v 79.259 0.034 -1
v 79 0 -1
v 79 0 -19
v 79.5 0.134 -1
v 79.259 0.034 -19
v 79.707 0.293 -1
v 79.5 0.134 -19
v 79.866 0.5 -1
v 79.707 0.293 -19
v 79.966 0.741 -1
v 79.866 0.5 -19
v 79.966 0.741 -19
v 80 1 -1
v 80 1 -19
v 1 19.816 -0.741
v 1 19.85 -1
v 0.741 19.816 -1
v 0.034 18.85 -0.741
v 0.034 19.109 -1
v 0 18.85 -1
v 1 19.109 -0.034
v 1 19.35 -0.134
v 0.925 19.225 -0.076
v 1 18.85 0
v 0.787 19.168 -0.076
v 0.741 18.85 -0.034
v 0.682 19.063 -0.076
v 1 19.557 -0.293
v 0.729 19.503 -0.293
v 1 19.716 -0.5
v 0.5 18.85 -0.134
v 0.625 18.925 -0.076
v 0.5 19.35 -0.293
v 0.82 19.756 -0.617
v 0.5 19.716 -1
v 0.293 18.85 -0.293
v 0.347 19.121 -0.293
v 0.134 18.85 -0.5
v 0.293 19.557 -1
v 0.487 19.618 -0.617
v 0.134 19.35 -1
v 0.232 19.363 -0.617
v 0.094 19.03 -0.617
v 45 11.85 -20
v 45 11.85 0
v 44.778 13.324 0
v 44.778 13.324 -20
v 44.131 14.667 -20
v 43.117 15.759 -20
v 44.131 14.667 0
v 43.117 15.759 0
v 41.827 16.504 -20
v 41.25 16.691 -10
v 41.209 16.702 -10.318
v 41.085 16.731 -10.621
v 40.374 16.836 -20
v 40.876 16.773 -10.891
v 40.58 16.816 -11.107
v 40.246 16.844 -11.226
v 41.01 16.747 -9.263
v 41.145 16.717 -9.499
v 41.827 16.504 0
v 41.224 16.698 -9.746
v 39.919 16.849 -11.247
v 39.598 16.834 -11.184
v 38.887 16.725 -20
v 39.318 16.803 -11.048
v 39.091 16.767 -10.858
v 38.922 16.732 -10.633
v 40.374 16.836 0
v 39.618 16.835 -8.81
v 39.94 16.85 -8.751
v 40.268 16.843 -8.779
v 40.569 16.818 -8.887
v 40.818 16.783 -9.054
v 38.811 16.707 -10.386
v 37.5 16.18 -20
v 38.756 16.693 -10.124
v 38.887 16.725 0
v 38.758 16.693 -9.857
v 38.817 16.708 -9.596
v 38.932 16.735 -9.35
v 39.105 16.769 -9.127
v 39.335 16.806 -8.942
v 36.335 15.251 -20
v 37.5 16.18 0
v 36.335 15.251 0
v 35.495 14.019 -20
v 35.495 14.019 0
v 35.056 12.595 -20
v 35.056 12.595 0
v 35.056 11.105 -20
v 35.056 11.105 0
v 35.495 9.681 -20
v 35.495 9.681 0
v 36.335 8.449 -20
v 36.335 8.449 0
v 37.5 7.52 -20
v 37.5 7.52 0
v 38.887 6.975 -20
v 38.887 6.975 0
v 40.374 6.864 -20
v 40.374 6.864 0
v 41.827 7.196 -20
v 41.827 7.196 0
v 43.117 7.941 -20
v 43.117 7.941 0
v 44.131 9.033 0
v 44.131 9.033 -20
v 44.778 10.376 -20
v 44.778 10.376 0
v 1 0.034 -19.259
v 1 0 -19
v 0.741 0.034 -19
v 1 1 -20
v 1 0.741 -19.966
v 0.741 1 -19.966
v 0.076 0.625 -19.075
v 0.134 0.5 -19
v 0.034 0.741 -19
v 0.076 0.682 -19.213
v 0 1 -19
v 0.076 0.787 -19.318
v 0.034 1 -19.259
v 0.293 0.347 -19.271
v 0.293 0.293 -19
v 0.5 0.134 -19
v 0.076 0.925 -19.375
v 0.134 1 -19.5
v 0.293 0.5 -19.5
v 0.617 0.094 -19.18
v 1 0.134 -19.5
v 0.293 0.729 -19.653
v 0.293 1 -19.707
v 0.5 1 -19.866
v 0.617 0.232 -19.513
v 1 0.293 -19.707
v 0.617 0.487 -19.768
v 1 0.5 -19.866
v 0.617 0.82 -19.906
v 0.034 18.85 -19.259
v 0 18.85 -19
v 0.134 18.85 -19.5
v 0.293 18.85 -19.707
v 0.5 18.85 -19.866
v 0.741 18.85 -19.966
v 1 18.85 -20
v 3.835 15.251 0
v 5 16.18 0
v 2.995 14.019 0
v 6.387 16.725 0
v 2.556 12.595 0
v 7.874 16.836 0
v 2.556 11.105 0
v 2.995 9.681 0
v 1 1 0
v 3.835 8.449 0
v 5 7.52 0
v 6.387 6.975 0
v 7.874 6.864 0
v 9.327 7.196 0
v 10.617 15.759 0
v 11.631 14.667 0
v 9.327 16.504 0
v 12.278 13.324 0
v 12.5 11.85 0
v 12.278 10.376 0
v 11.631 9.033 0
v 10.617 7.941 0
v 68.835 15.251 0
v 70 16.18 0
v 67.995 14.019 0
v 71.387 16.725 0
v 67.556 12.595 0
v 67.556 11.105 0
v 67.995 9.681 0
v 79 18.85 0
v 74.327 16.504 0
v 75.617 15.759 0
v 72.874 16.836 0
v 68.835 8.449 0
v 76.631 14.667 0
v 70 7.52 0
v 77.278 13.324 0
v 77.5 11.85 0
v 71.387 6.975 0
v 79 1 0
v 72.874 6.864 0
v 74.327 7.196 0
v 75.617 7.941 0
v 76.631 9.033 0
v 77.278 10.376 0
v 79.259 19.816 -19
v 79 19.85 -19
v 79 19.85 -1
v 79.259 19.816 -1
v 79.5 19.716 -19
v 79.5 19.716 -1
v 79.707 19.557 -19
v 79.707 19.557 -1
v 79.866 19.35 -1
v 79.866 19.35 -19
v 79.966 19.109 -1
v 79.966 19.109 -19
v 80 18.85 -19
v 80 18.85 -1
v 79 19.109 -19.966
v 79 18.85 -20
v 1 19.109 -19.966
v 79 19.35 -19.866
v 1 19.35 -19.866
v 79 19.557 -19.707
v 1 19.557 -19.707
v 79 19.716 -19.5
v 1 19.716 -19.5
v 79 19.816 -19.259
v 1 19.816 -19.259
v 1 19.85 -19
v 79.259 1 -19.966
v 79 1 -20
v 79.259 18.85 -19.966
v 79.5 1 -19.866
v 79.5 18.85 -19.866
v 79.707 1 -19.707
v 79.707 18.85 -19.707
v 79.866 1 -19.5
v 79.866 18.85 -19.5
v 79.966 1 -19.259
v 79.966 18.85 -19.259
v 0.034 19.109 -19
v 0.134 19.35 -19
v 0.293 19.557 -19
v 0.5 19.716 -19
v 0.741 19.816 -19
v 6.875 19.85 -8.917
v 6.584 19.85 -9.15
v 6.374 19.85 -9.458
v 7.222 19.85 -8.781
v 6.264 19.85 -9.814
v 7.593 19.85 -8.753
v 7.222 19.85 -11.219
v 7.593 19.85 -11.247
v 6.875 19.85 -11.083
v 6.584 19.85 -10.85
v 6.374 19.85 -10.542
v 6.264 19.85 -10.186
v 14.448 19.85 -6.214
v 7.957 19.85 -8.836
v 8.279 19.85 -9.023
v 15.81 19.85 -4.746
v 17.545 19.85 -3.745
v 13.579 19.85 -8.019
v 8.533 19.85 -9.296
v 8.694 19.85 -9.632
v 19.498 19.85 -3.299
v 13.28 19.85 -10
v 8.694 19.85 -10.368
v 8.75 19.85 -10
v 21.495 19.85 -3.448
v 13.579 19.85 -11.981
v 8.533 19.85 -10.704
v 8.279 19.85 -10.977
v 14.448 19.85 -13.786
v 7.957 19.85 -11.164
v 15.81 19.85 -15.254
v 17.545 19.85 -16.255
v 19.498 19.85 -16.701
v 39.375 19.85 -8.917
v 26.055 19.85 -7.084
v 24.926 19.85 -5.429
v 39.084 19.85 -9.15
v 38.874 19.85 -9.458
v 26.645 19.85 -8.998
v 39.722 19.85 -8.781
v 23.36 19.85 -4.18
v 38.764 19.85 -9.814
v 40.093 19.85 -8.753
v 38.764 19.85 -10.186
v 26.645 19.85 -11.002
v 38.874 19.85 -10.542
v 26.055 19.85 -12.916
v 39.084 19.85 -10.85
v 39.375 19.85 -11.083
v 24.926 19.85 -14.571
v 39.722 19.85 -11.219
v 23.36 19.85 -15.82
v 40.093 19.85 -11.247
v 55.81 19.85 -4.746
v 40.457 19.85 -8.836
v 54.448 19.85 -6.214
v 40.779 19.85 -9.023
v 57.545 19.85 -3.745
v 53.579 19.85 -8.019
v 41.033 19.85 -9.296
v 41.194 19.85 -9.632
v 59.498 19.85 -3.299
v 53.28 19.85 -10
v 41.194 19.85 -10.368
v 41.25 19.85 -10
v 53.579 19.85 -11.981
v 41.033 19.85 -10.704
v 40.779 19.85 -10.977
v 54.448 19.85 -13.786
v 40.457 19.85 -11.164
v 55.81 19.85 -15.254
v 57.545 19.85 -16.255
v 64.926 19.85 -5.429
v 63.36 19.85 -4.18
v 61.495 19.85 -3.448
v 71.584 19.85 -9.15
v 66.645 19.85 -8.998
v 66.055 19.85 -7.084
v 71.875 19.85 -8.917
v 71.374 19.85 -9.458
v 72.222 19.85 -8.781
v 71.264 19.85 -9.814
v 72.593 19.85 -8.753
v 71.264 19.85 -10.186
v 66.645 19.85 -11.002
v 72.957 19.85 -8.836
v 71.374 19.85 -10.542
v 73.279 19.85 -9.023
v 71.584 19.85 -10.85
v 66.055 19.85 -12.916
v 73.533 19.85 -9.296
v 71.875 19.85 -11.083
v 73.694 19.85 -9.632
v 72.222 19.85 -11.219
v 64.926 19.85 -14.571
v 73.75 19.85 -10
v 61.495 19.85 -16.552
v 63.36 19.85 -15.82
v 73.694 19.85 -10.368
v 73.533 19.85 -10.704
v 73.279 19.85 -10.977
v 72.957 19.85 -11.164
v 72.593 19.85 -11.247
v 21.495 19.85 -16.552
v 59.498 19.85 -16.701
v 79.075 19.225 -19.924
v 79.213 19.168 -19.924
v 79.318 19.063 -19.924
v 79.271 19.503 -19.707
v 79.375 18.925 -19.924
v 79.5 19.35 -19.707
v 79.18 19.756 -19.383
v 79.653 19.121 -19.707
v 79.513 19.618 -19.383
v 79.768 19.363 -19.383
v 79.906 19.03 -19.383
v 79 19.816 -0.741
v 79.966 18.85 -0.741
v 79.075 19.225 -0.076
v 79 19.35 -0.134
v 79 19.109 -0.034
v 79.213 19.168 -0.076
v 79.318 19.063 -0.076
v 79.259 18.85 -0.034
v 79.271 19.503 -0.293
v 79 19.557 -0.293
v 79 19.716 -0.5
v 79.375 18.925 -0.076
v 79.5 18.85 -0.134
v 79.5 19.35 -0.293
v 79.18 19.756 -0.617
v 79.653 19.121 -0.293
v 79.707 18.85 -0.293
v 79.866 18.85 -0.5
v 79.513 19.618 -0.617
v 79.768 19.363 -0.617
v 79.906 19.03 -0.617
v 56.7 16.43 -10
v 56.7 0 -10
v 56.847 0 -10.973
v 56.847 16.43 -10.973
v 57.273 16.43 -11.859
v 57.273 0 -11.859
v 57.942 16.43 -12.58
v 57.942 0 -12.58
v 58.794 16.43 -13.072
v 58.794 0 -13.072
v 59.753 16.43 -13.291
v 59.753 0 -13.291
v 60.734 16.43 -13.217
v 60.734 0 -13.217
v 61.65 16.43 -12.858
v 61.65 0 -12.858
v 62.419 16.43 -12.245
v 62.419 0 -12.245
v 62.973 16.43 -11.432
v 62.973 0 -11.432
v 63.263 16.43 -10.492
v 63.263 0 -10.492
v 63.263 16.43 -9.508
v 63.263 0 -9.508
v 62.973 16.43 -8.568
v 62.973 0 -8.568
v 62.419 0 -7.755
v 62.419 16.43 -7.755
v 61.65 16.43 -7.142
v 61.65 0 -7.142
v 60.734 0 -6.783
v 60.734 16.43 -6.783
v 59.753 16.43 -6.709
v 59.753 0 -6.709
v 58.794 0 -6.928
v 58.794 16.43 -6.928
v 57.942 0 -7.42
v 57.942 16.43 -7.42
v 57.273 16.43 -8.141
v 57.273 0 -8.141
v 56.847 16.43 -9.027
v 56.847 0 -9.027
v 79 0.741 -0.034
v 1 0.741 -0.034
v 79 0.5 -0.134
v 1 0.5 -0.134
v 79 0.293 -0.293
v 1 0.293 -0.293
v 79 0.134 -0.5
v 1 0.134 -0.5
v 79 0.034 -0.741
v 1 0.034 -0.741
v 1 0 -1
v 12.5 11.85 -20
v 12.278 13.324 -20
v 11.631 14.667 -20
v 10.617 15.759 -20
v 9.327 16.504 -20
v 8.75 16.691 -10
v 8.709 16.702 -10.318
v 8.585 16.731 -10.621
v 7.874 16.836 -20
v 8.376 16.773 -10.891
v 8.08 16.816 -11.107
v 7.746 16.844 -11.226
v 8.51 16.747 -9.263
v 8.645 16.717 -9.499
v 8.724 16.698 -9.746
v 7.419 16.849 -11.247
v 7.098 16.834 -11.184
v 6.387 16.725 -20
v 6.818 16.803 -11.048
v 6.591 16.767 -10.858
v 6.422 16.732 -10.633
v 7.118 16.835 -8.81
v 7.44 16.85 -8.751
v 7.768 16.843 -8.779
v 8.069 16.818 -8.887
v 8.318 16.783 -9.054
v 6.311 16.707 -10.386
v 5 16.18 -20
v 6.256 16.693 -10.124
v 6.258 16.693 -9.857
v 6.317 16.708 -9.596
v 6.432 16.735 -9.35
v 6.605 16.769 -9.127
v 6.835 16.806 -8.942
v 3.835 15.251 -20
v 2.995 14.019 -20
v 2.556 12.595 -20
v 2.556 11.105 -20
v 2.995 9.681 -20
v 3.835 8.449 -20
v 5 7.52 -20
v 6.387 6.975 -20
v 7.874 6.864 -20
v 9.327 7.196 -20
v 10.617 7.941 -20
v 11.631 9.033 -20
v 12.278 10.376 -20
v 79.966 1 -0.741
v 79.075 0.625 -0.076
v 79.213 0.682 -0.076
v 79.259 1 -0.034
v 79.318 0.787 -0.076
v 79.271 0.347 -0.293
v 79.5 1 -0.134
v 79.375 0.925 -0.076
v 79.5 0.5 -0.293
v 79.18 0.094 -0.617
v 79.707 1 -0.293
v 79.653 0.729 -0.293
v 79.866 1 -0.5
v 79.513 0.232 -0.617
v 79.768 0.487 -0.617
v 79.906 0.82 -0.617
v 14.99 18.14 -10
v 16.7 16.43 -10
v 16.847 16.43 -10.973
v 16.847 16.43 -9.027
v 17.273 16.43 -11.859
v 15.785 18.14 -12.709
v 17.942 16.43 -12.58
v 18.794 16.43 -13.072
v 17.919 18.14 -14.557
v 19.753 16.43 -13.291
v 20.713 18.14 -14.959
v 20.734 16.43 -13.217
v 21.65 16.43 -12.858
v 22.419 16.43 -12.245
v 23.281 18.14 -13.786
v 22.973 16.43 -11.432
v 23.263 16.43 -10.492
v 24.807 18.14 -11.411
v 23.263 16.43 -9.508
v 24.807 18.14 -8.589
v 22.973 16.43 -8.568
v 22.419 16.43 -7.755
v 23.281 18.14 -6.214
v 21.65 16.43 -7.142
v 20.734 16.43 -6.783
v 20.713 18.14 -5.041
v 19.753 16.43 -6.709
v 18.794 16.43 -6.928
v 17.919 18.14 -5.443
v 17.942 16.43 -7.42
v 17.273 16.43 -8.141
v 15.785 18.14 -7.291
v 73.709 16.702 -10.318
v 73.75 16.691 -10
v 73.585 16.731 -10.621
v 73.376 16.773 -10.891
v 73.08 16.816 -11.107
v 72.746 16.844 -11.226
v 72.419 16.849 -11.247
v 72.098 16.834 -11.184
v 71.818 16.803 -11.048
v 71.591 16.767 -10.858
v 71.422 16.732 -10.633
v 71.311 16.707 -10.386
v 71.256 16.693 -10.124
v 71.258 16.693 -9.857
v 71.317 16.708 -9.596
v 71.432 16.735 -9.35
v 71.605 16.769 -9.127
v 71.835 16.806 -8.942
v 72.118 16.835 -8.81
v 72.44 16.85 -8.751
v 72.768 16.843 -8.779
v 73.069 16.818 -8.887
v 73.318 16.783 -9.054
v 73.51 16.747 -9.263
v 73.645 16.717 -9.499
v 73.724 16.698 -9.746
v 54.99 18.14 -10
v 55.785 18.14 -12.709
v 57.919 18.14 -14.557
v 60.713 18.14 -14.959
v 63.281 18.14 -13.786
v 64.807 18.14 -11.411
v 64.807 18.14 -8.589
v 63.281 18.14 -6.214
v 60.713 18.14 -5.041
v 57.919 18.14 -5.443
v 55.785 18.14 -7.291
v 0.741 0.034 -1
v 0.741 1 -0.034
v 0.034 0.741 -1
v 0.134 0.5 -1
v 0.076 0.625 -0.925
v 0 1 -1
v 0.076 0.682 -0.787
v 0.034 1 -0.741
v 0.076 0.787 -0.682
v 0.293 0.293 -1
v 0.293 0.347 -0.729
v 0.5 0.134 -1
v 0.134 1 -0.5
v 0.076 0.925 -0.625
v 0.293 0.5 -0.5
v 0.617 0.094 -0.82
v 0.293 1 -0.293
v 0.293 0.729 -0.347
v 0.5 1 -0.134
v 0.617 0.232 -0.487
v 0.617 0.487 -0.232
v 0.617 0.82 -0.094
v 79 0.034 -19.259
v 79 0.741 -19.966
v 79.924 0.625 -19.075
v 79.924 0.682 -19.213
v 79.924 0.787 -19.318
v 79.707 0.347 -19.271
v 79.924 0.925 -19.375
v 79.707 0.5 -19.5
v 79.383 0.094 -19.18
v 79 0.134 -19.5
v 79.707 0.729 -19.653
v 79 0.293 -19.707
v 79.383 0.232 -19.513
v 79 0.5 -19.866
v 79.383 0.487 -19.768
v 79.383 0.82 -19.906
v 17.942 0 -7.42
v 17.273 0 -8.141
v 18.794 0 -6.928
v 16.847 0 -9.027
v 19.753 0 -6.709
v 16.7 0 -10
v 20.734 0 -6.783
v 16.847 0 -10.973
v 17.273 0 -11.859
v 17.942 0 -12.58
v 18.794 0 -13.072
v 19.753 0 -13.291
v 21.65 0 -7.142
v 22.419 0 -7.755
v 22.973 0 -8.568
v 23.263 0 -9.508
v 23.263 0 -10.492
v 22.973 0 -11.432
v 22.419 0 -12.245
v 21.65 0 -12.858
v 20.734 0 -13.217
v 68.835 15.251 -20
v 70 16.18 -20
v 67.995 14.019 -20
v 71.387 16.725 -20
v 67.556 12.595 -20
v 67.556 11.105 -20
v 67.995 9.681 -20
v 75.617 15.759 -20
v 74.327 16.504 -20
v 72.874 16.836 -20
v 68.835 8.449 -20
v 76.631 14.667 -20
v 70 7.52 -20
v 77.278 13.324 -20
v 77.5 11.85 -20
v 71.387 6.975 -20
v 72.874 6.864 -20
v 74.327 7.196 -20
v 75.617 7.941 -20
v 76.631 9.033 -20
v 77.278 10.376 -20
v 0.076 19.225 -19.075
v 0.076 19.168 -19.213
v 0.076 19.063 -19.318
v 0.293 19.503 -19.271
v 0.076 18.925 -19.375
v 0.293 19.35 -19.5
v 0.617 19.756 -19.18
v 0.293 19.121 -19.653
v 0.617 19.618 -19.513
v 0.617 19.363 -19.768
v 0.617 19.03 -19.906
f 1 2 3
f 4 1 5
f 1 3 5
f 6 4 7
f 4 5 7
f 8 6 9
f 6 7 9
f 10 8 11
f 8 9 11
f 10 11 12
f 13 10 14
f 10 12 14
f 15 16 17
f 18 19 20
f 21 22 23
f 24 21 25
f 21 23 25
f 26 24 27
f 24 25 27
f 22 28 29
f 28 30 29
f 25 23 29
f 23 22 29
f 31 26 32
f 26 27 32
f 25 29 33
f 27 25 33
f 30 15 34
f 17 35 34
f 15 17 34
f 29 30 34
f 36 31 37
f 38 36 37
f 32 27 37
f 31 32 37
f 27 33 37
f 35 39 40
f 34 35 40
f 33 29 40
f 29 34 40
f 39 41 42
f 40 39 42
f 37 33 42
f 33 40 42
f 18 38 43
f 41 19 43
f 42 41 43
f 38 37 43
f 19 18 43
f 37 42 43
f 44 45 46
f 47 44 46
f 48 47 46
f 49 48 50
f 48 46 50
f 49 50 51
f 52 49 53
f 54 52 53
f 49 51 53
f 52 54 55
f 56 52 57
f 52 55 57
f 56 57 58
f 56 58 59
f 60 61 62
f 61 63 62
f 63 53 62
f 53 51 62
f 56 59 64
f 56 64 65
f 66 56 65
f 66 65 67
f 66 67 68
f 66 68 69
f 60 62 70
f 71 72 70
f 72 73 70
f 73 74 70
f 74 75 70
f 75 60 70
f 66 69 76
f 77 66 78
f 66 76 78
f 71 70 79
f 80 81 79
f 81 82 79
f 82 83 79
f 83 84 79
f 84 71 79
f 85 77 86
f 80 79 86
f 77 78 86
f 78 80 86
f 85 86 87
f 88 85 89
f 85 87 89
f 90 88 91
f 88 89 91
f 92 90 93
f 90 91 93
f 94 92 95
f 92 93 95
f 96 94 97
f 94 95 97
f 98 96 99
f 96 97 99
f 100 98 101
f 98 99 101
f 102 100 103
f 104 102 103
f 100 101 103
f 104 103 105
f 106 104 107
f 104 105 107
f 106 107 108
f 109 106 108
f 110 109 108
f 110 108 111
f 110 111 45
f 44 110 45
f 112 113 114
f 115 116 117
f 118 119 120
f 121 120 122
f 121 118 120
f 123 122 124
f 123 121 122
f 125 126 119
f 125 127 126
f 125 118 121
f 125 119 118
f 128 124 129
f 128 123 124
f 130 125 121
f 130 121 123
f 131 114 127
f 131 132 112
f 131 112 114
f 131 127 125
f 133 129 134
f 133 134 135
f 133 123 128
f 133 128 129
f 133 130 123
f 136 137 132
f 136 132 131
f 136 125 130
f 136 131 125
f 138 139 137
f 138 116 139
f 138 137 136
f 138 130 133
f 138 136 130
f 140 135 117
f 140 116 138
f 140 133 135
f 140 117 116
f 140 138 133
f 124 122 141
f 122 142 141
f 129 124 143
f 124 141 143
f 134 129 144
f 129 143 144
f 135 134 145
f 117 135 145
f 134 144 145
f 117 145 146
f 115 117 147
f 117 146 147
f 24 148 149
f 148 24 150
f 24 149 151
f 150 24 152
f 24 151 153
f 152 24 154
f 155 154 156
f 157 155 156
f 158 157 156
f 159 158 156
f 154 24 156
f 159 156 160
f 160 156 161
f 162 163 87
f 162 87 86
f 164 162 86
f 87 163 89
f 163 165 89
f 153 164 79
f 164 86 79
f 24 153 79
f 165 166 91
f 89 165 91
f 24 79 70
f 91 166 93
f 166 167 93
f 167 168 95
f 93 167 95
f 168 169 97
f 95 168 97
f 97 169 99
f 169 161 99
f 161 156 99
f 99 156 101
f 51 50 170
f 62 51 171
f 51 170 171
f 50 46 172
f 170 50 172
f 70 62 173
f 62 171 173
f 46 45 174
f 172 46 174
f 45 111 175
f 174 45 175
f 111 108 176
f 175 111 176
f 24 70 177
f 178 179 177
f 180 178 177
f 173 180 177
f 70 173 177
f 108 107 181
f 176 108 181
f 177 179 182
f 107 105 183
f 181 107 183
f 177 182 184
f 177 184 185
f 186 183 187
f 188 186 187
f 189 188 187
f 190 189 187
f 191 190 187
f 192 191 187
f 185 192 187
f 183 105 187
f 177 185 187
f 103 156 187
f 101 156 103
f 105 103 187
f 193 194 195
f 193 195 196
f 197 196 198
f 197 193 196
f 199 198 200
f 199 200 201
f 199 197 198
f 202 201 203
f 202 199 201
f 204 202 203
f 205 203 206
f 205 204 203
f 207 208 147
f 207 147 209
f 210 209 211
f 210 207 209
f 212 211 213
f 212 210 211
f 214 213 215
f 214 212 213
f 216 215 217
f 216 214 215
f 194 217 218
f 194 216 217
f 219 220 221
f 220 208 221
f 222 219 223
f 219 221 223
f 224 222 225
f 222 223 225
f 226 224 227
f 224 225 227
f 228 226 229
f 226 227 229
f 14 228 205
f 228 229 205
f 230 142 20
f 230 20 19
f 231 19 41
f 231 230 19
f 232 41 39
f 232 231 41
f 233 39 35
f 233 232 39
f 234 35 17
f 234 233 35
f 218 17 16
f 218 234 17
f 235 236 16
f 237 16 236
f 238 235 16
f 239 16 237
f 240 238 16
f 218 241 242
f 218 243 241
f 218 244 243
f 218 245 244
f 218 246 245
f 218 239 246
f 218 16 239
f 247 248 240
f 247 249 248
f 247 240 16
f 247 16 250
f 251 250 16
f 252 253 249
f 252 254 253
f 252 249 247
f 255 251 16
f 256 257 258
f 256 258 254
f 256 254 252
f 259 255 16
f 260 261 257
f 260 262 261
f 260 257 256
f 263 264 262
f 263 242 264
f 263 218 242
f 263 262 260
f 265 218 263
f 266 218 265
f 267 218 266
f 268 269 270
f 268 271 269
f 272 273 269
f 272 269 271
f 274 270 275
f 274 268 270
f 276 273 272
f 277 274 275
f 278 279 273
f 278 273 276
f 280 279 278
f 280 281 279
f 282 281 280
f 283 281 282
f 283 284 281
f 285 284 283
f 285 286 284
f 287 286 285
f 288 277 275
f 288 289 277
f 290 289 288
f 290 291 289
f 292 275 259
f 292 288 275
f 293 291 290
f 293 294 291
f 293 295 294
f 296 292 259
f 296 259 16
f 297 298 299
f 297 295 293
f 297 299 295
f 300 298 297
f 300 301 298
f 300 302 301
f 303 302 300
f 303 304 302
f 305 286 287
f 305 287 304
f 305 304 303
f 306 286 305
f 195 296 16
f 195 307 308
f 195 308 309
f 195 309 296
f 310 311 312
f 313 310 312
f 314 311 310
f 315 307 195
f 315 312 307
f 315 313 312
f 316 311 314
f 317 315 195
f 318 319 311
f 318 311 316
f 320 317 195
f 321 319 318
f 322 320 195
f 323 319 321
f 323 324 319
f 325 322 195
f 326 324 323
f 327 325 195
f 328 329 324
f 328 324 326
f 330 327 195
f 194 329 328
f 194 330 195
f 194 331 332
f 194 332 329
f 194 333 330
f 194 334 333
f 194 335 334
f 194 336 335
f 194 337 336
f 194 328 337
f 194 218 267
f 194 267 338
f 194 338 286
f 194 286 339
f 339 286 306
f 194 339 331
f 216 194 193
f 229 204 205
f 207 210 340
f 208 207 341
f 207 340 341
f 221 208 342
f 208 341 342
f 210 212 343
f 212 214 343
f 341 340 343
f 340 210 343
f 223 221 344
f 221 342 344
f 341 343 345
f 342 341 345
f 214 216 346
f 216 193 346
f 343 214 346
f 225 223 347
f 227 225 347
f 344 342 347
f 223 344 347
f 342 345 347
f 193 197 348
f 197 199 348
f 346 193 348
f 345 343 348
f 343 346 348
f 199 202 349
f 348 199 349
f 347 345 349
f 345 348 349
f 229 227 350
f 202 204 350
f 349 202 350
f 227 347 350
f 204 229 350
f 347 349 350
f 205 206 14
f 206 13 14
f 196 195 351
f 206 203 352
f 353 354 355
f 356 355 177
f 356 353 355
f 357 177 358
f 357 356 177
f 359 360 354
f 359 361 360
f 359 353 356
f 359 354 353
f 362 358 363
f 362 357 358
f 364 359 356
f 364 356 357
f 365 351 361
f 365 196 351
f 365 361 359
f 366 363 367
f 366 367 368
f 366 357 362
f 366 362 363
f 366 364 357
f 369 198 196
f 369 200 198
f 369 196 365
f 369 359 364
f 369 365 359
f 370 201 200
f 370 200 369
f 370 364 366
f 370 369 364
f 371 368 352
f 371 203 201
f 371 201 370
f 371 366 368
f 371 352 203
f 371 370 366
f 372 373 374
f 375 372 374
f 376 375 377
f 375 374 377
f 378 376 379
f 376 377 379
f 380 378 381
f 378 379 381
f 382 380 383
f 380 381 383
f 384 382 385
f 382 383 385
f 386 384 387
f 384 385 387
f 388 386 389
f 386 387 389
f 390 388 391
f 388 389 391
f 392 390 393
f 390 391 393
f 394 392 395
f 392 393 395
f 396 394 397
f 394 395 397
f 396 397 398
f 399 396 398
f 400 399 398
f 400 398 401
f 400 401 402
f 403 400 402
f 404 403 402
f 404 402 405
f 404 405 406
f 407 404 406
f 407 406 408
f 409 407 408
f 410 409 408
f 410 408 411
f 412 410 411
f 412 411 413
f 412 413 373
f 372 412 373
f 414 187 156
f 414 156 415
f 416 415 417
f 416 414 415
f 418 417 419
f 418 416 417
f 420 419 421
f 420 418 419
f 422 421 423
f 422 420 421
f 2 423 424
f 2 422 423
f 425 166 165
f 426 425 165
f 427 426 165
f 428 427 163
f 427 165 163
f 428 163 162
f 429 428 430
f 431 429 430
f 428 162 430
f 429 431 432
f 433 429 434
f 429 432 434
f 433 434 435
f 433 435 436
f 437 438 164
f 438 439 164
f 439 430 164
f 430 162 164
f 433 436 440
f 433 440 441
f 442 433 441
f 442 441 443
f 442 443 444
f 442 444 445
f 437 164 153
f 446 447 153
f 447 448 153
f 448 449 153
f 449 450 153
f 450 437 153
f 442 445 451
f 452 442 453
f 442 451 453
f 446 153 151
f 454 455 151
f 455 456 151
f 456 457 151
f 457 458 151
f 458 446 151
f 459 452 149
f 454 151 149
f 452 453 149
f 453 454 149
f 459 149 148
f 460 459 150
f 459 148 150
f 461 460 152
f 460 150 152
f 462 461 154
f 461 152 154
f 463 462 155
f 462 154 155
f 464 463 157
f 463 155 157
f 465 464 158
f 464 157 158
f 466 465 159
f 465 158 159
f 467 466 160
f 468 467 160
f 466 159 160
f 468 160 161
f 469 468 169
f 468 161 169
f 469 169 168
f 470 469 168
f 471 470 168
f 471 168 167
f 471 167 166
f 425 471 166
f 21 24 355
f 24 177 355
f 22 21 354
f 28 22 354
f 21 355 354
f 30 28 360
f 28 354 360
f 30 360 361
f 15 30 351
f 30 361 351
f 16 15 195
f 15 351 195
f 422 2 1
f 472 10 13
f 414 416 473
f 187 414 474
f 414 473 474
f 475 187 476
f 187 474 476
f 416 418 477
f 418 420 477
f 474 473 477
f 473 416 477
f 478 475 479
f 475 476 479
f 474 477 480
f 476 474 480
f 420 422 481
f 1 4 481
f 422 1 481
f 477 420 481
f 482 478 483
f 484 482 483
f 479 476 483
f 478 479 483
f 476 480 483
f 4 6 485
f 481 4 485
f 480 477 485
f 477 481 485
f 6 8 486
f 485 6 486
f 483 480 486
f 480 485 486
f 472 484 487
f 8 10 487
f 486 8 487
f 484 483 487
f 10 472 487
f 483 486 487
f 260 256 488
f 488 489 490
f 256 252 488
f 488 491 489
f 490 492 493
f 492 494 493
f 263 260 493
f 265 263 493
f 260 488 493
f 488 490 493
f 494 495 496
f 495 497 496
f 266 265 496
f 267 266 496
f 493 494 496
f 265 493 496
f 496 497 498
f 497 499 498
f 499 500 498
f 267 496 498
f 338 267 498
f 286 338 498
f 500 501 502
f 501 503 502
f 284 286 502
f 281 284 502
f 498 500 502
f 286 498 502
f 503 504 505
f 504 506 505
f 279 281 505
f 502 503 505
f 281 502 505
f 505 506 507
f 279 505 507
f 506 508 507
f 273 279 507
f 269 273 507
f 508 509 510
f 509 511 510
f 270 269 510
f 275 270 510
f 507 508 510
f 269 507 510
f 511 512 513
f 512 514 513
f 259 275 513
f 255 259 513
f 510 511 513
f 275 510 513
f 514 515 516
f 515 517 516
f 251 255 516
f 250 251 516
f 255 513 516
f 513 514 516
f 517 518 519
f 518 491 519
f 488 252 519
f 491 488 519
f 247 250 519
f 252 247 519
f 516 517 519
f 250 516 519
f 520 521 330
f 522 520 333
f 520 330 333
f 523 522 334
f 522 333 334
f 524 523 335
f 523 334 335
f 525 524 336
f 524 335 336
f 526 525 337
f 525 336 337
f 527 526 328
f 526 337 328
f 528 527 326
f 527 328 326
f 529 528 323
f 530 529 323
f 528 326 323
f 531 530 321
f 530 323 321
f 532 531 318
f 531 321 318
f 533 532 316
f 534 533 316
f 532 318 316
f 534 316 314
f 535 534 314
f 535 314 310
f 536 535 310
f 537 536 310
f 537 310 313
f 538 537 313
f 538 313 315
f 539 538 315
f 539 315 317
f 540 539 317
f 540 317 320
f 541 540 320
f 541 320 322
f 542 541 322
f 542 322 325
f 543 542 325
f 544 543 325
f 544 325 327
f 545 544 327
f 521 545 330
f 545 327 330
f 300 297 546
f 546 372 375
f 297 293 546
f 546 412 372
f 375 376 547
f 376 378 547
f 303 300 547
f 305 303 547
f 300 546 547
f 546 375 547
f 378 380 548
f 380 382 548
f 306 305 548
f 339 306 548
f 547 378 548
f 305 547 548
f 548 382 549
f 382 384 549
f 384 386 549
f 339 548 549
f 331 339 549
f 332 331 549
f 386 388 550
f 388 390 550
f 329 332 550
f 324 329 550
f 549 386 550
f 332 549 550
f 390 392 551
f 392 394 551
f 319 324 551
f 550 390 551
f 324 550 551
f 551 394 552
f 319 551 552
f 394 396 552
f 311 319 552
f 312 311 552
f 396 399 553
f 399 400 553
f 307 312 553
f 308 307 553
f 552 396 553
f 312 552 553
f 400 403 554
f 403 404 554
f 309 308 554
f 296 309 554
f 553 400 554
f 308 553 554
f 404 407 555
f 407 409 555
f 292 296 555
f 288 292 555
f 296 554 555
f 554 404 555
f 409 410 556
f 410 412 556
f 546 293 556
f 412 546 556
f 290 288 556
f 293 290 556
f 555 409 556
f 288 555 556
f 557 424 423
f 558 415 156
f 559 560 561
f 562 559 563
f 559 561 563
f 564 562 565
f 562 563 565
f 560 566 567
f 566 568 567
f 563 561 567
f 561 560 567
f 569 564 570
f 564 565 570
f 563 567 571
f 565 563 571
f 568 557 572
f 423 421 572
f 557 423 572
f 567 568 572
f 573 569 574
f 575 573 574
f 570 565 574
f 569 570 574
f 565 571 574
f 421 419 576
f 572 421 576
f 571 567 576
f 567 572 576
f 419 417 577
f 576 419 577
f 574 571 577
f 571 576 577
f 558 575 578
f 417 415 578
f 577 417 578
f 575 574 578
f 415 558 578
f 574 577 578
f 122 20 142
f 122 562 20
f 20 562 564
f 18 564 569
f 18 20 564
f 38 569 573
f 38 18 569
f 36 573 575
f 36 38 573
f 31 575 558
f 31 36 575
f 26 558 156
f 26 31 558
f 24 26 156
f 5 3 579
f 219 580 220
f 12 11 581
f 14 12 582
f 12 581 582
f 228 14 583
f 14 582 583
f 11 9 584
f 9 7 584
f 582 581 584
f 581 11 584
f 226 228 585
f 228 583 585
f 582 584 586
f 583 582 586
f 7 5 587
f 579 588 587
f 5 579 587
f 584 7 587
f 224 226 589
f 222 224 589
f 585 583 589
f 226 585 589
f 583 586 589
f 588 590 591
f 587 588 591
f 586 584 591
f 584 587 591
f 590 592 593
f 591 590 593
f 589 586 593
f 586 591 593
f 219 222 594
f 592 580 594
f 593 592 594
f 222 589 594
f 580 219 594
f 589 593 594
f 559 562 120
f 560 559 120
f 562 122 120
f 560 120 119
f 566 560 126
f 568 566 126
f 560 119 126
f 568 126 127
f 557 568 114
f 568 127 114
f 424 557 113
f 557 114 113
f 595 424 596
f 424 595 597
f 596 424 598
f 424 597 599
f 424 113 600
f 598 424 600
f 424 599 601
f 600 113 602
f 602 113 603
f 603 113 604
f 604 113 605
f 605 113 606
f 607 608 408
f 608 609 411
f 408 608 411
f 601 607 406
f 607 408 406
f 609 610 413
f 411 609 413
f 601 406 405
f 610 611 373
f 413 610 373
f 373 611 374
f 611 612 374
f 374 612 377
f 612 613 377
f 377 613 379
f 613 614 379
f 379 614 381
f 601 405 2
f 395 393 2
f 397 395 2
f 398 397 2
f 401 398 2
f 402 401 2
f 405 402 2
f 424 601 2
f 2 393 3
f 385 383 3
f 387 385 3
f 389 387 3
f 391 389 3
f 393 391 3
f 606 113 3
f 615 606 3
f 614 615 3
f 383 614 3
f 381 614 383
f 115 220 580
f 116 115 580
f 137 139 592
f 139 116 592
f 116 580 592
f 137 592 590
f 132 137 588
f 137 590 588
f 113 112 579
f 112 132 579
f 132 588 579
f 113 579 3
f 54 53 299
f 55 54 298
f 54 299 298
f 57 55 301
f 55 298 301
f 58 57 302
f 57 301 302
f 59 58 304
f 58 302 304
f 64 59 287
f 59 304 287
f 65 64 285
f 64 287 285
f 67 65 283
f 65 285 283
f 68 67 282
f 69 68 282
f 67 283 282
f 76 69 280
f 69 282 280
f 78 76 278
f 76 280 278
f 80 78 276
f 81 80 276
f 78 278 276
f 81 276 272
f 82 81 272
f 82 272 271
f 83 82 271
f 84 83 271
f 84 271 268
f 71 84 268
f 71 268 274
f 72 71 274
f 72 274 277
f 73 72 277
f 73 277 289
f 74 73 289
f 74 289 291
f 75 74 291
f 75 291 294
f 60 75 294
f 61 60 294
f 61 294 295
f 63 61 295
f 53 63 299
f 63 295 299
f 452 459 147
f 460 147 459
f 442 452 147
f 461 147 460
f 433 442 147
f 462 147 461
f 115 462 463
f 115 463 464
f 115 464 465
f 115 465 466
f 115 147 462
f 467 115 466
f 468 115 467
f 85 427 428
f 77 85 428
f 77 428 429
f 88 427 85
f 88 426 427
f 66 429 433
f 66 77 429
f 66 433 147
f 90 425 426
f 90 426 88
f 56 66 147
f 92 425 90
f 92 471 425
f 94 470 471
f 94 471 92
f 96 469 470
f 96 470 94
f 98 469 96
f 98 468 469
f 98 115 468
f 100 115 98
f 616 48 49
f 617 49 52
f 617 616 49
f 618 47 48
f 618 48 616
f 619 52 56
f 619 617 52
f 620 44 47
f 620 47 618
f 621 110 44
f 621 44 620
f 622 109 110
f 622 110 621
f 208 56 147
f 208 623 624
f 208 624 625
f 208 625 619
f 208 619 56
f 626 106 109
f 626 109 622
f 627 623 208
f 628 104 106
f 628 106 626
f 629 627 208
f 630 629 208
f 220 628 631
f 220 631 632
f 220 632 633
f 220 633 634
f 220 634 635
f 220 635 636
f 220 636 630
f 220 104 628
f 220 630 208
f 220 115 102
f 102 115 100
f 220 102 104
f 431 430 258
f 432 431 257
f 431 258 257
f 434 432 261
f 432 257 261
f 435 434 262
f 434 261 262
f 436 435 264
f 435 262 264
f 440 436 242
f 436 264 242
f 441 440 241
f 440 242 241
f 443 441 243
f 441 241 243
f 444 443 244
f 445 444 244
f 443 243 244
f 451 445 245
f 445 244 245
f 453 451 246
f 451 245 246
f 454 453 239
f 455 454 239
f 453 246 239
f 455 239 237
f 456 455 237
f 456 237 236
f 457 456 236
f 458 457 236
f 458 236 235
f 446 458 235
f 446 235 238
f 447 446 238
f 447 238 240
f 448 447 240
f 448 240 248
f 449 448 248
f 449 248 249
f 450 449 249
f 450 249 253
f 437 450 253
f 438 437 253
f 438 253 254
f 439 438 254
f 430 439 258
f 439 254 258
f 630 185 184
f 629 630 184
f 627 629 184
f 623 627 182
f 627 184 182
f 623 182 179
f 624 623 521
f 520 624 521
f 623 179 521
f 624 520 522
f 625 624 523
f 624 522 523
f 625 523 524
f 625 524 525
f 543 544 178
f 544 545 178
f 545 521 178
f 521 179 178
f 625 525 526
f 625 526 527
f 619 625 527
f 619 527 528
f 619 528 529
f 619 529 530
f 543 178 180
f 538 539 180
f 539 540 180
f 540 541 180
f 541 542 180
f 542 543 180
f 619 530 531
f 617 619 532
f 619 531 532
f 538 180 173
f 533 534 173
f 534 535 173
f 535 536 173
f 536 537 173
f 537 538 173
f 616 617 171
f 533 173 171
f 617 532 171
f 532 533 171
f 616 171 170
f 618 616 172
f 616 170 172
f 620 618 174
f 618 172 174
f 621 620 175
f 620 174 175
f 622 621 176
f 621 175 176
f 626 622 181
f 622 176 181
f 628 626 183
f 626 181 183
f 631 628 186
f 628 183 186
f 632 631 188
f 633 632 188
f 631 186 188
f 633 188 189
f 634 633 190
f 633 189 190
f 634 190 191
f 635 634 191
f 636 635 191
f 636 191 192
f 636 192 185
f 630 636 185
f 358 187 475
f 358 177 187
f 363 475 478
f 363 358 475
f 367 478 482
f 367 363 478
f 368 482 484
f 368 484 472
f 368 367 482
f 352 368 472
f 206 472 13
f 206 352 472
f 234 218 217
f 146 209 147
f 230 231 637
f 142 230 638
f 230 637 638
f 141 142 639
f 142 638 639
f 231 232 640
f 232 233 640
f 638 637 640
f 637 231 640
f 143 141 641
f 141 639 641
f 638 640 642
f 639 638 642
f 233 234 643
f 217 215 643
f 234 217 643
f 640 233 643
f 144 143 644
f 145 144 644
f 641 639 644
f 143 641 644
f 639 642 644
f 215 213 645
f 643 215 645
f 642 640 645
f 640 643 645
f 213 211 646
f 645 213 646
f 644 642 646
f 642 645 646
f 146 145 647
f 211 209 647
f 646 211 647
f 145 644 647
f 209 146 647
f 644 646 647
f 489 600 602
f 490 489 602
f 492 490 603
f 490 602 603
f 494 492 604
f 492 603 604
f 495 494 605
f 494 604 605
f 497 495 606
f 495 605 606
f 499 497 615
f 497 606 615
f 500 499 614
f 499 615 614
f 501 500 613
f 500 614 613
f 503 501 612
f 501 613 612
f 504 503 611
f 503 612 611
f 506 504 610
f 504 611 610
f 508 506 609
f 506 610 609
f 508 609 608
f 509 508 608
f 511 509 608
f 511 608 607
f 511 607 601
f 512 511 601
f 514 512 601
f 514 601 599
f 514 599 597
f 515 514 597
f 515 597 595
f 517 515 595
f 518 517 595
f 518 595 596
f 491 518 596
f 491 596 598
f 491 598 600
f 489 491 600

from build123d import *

# Parameters (mm, degrees)
SKETCH1_W                     = 80
SKETCH1_H                     = 20
BOSS_EXTRUDE1_DEPTH           = 19.85
CUT_EXTRUDE1_REACH            = 86.818
SKETCH2_R                     = 3.1
CUT_EXTRUDE2_REACH            = 86.818
SKETCH3_R                     = 5
FILLET1_R                     = 1
CSK_FOR_M6_SFHCS1_D           = 6.6
CSK_FOR_M6_SFHCS1_DEPTH       = 19.85
CSK_FOR_M6_SFHCS1_CSINK_D     = 13.44
CSK_FOR_M6_SFHCS1_CSINK_ANGLE = 90
M3X0_5_TAPPED_HOLE1_REACH     = 86.818
M3X0_5_TAPPED_HOLE1_BORE_R    = 1.25


with BuildPart() as part:
    # Sketch1 → Boss-Extrude1 (new body)
    with BuildSketch(Plane(origin=(0, 0, 0), x_dir=(1, 0, 0), z_dir=(0, 1, 0))):
        with Locations((40, 10)):
            Rectangle(SKETCH1_W, SKETCH1_H)
    extrude(amount=BOSS_EXTRUDE1_DEPTH)

    # Sketch2 → Cut-Extrude1 (cut, up to next)
    with BuildSketch(Plane(origin=(0, 19.85, 0), x_dir=(1, 0, 0), z_dir=(0, 1, 0)), mode=Mode.PRIVATE) as cut_extrude1_sk1:
        with Locations(Location((20, 10, 0), (0, 0, 270))):
            Circle(SKETCH2_R)
    cut_extrude1_tool1 = extrude(cut_extrude1_sk1.sketch, amount=-CUT_EXTRUDE1_REACH, mode=Mode.PRIVATE) & part.part
    # Sketch2 → Cut-Extrude1 (cut, up to next)
    with BuildSketch(Plane(origin=(0, 19.85, 0), x_dir=(1, 0, 0), z_dir=(0, 1, 0)), mode=Mode.PRIVATE) as cut_extrude1_sk2:
        with Locations(Location((60, 10, 0), (0, 0, 270))):
            Circle(SKETCH2_R)
    cut_extrude1_tool2 = extrude(cut_extrude1_sk2.sketch, amount=-CUT_EXTRUDE1_REACH, mode=Mode.PRIVATE) & part.part
    add(cut_extrude1_tool1.solids().sort_by_distance((20, 19.85, -10))[0], mode=Mode.SUBTRACT)
    add(cut_extrude1_tool2.solids().sort_by_distance((60, 19.85, -10))[0], mode=Mode.SUBTRACT)

    # Sketch3 → Cut-Extrude2 (cut, up to next)
    with BuildSketch(Plane.XY, mode=Mode.PRIVATE) as cut_extrude2_sk1:
        with Locations((7.5, 11.85)):
            Circle(SKETCH3_R)
    cut_extrude2_tool1 = extrude(cut_extrude2_sk1.sketch, amount=-CUT_EXTRUDE2_REACH, mode=Mode.PRIVATE) & part.part
    # Sketch3 → Cut-Extrude2 (cut, up to next)
    with BuildSketch(Plane.XY, mode=Mode.PRIVATE) as cut_extrude2_sk2:
        with Locations((72.5, 11.85)):
            Circle(SKETCH3_R)
    cut_extrude2_tool2 = extrude(cut_extrude2_sk2.sketch, amount=-CUT_EXTRUDE2_REACH, mode=Mode.PRIVATE) & part.part
    # Sketch3 → Cut-Extrude2 (cut, up to next)
    with BuildSketch(Plane.XY, mode=Mode.PRIVATE) as cut_extrude2_sk3:
        with Locations((40, 11.85)):
            Circle(SKETCH3_R)
    cut_extrude2_tool3 = extrude(cut_extrude2_sk3.sketch, amount=-CUT_EXTRUDE2_REACH, mode=Mode.PRIVATE) & part.part
    add(cut_extrude2_tool1.solids().sort_by_distance((7.5, 11.85, 0))[0], mode=Mode.SUBTRACT)
    add(cut_extrude2_tool2.solids().sort_by_distance((72.5, 11.85, 0))[0], mode=Mode.SUBTRACT)
    add(cut_extrude2_tool3.solids().sort_by_distance((40, 11.85, 0))[0], mode=Mode.SUBTRACT)

    # Fillet1
    fillet1_edges = [part.edges().sort_by_distance(p)[0] for p in [
        (80, 19.85, -10),
        (40, 19.85, -20),
        (0, 19.85, -10),
        (40, 0, -20),
        (80, 0, -10),
        (40, 0, 0),
        (0, 0, -10),
        (40, 19.85, 0),
        (0, 9.925, -20),
        (80, 9.925, -20),
        (80, 9.925, 0),
        (0, 9.925, 0),
    ]]
    fillet(fillet1_edges, radius=FILLET1_R)

    # CSK for M6 SFHCS1
    with Locations(Plane(origin=(0, 19.85, 0), x_dir=(1, 0, 0), z_dir=(0, 1, 0))):
        with Locations((60, 10), (20, 10)):
            CounterSinkHole(CSK_FOR_M6_SFHCS1_D / 2, CSK_FOR_M6_SFHCS1_CSINK_D / 2, depth=CSK_FOR_M6_SFHCS1_DEPTH, counter_sink_angle=CSK_FOR_M6_SFHCS1_CSINK_ANGLE)

    # M3x0.5 Tapped Hole1 bore → M3x0.5 Tapped Hole1 (cut, up to next)
    with BuildSketch(Plane(origin=(0, 19.85, 0), x_dir=(1, 0, 0), z_dir=(0, 1, 0)), mode=Mode.PRIVATE) as m3x0_5_tapped_hole1_sk1:
        with Locations((7.5, 10)):
            Circle(M3X0_5_TAPPED_HOLE1_BORE_R)
    m3x0_5_tapped_hole1_tool1 = extrude(m3x0_5_tapped_hole1_sk1.sketch, amount=-M3X0_5_TAPPED_HOLE1_REACH, mode=Mode.PRIVATE) & part.part
    # M3x0.5 Tapped Hole1 bore → M3x0.5 Tapped Hole1 (cut, up to next)
    with BuildSketch(Plane(origin=(0, 19.85, 0), x_dir=(1, 0, 0), z_dir=(0, 1, 0)), mode=Mode.PRIVATE) as m3x0_5_tapped_hole1_sk2:
        with Locations((40, 10)):
            Circle(M3X0_5_TAPPED_HOLE1_BORE_R)
    m3x0_5_tapped_hole1_tool2 = extrude(m3x0_5_tapped_hole1_sk2.sketch, amount=-M3X0_5_TAPPED_HOLE1_REACH, mode=Mode.PRIVATE) & part.part
    # M3x0.5 Tapped Hole1 bore → M3x0.5 Tapped Hole1 (cut, up to next)
    with BuildSketch(Plane(origin=(0, 19.85, 0), x_dir=(1, 0, 0), z_dir=(0, 1, 0)), mode=Mode.PRIVATE) as m3x0_5_tapped_hole1_sk3:
        with Locations((72.5, 10)):
            Circle(M3X0_5_TAPPED_HOLE1_BORE_R)
    m3x0_5_tapped_hole1_tool3 = extrude(m3x0_5_tapped_hole1_sk3.sketch, amount=-M3X0_5_TAPPED_HOLE1_REACH, mode=Mode.PRIVATE) & part.part
    add(m3x0_5_tapped_hole1_tool1.solids().sort_by_distance((7.5, 19.85, -10))[0], mode=Mode.SUBTRACT)
    add(m3x0_5_tapped_hole1_tool2.solids().sort_by_distance((40, 19.85, -10))[0], mode=Mode.SUBTRACT)
    add(m3x0_5_tapped_hole1_tool3.solids().sort_by_distance((72.5, 19.85, -10))[0], mode=Mode.SUBTRACT)


solid = part.part
